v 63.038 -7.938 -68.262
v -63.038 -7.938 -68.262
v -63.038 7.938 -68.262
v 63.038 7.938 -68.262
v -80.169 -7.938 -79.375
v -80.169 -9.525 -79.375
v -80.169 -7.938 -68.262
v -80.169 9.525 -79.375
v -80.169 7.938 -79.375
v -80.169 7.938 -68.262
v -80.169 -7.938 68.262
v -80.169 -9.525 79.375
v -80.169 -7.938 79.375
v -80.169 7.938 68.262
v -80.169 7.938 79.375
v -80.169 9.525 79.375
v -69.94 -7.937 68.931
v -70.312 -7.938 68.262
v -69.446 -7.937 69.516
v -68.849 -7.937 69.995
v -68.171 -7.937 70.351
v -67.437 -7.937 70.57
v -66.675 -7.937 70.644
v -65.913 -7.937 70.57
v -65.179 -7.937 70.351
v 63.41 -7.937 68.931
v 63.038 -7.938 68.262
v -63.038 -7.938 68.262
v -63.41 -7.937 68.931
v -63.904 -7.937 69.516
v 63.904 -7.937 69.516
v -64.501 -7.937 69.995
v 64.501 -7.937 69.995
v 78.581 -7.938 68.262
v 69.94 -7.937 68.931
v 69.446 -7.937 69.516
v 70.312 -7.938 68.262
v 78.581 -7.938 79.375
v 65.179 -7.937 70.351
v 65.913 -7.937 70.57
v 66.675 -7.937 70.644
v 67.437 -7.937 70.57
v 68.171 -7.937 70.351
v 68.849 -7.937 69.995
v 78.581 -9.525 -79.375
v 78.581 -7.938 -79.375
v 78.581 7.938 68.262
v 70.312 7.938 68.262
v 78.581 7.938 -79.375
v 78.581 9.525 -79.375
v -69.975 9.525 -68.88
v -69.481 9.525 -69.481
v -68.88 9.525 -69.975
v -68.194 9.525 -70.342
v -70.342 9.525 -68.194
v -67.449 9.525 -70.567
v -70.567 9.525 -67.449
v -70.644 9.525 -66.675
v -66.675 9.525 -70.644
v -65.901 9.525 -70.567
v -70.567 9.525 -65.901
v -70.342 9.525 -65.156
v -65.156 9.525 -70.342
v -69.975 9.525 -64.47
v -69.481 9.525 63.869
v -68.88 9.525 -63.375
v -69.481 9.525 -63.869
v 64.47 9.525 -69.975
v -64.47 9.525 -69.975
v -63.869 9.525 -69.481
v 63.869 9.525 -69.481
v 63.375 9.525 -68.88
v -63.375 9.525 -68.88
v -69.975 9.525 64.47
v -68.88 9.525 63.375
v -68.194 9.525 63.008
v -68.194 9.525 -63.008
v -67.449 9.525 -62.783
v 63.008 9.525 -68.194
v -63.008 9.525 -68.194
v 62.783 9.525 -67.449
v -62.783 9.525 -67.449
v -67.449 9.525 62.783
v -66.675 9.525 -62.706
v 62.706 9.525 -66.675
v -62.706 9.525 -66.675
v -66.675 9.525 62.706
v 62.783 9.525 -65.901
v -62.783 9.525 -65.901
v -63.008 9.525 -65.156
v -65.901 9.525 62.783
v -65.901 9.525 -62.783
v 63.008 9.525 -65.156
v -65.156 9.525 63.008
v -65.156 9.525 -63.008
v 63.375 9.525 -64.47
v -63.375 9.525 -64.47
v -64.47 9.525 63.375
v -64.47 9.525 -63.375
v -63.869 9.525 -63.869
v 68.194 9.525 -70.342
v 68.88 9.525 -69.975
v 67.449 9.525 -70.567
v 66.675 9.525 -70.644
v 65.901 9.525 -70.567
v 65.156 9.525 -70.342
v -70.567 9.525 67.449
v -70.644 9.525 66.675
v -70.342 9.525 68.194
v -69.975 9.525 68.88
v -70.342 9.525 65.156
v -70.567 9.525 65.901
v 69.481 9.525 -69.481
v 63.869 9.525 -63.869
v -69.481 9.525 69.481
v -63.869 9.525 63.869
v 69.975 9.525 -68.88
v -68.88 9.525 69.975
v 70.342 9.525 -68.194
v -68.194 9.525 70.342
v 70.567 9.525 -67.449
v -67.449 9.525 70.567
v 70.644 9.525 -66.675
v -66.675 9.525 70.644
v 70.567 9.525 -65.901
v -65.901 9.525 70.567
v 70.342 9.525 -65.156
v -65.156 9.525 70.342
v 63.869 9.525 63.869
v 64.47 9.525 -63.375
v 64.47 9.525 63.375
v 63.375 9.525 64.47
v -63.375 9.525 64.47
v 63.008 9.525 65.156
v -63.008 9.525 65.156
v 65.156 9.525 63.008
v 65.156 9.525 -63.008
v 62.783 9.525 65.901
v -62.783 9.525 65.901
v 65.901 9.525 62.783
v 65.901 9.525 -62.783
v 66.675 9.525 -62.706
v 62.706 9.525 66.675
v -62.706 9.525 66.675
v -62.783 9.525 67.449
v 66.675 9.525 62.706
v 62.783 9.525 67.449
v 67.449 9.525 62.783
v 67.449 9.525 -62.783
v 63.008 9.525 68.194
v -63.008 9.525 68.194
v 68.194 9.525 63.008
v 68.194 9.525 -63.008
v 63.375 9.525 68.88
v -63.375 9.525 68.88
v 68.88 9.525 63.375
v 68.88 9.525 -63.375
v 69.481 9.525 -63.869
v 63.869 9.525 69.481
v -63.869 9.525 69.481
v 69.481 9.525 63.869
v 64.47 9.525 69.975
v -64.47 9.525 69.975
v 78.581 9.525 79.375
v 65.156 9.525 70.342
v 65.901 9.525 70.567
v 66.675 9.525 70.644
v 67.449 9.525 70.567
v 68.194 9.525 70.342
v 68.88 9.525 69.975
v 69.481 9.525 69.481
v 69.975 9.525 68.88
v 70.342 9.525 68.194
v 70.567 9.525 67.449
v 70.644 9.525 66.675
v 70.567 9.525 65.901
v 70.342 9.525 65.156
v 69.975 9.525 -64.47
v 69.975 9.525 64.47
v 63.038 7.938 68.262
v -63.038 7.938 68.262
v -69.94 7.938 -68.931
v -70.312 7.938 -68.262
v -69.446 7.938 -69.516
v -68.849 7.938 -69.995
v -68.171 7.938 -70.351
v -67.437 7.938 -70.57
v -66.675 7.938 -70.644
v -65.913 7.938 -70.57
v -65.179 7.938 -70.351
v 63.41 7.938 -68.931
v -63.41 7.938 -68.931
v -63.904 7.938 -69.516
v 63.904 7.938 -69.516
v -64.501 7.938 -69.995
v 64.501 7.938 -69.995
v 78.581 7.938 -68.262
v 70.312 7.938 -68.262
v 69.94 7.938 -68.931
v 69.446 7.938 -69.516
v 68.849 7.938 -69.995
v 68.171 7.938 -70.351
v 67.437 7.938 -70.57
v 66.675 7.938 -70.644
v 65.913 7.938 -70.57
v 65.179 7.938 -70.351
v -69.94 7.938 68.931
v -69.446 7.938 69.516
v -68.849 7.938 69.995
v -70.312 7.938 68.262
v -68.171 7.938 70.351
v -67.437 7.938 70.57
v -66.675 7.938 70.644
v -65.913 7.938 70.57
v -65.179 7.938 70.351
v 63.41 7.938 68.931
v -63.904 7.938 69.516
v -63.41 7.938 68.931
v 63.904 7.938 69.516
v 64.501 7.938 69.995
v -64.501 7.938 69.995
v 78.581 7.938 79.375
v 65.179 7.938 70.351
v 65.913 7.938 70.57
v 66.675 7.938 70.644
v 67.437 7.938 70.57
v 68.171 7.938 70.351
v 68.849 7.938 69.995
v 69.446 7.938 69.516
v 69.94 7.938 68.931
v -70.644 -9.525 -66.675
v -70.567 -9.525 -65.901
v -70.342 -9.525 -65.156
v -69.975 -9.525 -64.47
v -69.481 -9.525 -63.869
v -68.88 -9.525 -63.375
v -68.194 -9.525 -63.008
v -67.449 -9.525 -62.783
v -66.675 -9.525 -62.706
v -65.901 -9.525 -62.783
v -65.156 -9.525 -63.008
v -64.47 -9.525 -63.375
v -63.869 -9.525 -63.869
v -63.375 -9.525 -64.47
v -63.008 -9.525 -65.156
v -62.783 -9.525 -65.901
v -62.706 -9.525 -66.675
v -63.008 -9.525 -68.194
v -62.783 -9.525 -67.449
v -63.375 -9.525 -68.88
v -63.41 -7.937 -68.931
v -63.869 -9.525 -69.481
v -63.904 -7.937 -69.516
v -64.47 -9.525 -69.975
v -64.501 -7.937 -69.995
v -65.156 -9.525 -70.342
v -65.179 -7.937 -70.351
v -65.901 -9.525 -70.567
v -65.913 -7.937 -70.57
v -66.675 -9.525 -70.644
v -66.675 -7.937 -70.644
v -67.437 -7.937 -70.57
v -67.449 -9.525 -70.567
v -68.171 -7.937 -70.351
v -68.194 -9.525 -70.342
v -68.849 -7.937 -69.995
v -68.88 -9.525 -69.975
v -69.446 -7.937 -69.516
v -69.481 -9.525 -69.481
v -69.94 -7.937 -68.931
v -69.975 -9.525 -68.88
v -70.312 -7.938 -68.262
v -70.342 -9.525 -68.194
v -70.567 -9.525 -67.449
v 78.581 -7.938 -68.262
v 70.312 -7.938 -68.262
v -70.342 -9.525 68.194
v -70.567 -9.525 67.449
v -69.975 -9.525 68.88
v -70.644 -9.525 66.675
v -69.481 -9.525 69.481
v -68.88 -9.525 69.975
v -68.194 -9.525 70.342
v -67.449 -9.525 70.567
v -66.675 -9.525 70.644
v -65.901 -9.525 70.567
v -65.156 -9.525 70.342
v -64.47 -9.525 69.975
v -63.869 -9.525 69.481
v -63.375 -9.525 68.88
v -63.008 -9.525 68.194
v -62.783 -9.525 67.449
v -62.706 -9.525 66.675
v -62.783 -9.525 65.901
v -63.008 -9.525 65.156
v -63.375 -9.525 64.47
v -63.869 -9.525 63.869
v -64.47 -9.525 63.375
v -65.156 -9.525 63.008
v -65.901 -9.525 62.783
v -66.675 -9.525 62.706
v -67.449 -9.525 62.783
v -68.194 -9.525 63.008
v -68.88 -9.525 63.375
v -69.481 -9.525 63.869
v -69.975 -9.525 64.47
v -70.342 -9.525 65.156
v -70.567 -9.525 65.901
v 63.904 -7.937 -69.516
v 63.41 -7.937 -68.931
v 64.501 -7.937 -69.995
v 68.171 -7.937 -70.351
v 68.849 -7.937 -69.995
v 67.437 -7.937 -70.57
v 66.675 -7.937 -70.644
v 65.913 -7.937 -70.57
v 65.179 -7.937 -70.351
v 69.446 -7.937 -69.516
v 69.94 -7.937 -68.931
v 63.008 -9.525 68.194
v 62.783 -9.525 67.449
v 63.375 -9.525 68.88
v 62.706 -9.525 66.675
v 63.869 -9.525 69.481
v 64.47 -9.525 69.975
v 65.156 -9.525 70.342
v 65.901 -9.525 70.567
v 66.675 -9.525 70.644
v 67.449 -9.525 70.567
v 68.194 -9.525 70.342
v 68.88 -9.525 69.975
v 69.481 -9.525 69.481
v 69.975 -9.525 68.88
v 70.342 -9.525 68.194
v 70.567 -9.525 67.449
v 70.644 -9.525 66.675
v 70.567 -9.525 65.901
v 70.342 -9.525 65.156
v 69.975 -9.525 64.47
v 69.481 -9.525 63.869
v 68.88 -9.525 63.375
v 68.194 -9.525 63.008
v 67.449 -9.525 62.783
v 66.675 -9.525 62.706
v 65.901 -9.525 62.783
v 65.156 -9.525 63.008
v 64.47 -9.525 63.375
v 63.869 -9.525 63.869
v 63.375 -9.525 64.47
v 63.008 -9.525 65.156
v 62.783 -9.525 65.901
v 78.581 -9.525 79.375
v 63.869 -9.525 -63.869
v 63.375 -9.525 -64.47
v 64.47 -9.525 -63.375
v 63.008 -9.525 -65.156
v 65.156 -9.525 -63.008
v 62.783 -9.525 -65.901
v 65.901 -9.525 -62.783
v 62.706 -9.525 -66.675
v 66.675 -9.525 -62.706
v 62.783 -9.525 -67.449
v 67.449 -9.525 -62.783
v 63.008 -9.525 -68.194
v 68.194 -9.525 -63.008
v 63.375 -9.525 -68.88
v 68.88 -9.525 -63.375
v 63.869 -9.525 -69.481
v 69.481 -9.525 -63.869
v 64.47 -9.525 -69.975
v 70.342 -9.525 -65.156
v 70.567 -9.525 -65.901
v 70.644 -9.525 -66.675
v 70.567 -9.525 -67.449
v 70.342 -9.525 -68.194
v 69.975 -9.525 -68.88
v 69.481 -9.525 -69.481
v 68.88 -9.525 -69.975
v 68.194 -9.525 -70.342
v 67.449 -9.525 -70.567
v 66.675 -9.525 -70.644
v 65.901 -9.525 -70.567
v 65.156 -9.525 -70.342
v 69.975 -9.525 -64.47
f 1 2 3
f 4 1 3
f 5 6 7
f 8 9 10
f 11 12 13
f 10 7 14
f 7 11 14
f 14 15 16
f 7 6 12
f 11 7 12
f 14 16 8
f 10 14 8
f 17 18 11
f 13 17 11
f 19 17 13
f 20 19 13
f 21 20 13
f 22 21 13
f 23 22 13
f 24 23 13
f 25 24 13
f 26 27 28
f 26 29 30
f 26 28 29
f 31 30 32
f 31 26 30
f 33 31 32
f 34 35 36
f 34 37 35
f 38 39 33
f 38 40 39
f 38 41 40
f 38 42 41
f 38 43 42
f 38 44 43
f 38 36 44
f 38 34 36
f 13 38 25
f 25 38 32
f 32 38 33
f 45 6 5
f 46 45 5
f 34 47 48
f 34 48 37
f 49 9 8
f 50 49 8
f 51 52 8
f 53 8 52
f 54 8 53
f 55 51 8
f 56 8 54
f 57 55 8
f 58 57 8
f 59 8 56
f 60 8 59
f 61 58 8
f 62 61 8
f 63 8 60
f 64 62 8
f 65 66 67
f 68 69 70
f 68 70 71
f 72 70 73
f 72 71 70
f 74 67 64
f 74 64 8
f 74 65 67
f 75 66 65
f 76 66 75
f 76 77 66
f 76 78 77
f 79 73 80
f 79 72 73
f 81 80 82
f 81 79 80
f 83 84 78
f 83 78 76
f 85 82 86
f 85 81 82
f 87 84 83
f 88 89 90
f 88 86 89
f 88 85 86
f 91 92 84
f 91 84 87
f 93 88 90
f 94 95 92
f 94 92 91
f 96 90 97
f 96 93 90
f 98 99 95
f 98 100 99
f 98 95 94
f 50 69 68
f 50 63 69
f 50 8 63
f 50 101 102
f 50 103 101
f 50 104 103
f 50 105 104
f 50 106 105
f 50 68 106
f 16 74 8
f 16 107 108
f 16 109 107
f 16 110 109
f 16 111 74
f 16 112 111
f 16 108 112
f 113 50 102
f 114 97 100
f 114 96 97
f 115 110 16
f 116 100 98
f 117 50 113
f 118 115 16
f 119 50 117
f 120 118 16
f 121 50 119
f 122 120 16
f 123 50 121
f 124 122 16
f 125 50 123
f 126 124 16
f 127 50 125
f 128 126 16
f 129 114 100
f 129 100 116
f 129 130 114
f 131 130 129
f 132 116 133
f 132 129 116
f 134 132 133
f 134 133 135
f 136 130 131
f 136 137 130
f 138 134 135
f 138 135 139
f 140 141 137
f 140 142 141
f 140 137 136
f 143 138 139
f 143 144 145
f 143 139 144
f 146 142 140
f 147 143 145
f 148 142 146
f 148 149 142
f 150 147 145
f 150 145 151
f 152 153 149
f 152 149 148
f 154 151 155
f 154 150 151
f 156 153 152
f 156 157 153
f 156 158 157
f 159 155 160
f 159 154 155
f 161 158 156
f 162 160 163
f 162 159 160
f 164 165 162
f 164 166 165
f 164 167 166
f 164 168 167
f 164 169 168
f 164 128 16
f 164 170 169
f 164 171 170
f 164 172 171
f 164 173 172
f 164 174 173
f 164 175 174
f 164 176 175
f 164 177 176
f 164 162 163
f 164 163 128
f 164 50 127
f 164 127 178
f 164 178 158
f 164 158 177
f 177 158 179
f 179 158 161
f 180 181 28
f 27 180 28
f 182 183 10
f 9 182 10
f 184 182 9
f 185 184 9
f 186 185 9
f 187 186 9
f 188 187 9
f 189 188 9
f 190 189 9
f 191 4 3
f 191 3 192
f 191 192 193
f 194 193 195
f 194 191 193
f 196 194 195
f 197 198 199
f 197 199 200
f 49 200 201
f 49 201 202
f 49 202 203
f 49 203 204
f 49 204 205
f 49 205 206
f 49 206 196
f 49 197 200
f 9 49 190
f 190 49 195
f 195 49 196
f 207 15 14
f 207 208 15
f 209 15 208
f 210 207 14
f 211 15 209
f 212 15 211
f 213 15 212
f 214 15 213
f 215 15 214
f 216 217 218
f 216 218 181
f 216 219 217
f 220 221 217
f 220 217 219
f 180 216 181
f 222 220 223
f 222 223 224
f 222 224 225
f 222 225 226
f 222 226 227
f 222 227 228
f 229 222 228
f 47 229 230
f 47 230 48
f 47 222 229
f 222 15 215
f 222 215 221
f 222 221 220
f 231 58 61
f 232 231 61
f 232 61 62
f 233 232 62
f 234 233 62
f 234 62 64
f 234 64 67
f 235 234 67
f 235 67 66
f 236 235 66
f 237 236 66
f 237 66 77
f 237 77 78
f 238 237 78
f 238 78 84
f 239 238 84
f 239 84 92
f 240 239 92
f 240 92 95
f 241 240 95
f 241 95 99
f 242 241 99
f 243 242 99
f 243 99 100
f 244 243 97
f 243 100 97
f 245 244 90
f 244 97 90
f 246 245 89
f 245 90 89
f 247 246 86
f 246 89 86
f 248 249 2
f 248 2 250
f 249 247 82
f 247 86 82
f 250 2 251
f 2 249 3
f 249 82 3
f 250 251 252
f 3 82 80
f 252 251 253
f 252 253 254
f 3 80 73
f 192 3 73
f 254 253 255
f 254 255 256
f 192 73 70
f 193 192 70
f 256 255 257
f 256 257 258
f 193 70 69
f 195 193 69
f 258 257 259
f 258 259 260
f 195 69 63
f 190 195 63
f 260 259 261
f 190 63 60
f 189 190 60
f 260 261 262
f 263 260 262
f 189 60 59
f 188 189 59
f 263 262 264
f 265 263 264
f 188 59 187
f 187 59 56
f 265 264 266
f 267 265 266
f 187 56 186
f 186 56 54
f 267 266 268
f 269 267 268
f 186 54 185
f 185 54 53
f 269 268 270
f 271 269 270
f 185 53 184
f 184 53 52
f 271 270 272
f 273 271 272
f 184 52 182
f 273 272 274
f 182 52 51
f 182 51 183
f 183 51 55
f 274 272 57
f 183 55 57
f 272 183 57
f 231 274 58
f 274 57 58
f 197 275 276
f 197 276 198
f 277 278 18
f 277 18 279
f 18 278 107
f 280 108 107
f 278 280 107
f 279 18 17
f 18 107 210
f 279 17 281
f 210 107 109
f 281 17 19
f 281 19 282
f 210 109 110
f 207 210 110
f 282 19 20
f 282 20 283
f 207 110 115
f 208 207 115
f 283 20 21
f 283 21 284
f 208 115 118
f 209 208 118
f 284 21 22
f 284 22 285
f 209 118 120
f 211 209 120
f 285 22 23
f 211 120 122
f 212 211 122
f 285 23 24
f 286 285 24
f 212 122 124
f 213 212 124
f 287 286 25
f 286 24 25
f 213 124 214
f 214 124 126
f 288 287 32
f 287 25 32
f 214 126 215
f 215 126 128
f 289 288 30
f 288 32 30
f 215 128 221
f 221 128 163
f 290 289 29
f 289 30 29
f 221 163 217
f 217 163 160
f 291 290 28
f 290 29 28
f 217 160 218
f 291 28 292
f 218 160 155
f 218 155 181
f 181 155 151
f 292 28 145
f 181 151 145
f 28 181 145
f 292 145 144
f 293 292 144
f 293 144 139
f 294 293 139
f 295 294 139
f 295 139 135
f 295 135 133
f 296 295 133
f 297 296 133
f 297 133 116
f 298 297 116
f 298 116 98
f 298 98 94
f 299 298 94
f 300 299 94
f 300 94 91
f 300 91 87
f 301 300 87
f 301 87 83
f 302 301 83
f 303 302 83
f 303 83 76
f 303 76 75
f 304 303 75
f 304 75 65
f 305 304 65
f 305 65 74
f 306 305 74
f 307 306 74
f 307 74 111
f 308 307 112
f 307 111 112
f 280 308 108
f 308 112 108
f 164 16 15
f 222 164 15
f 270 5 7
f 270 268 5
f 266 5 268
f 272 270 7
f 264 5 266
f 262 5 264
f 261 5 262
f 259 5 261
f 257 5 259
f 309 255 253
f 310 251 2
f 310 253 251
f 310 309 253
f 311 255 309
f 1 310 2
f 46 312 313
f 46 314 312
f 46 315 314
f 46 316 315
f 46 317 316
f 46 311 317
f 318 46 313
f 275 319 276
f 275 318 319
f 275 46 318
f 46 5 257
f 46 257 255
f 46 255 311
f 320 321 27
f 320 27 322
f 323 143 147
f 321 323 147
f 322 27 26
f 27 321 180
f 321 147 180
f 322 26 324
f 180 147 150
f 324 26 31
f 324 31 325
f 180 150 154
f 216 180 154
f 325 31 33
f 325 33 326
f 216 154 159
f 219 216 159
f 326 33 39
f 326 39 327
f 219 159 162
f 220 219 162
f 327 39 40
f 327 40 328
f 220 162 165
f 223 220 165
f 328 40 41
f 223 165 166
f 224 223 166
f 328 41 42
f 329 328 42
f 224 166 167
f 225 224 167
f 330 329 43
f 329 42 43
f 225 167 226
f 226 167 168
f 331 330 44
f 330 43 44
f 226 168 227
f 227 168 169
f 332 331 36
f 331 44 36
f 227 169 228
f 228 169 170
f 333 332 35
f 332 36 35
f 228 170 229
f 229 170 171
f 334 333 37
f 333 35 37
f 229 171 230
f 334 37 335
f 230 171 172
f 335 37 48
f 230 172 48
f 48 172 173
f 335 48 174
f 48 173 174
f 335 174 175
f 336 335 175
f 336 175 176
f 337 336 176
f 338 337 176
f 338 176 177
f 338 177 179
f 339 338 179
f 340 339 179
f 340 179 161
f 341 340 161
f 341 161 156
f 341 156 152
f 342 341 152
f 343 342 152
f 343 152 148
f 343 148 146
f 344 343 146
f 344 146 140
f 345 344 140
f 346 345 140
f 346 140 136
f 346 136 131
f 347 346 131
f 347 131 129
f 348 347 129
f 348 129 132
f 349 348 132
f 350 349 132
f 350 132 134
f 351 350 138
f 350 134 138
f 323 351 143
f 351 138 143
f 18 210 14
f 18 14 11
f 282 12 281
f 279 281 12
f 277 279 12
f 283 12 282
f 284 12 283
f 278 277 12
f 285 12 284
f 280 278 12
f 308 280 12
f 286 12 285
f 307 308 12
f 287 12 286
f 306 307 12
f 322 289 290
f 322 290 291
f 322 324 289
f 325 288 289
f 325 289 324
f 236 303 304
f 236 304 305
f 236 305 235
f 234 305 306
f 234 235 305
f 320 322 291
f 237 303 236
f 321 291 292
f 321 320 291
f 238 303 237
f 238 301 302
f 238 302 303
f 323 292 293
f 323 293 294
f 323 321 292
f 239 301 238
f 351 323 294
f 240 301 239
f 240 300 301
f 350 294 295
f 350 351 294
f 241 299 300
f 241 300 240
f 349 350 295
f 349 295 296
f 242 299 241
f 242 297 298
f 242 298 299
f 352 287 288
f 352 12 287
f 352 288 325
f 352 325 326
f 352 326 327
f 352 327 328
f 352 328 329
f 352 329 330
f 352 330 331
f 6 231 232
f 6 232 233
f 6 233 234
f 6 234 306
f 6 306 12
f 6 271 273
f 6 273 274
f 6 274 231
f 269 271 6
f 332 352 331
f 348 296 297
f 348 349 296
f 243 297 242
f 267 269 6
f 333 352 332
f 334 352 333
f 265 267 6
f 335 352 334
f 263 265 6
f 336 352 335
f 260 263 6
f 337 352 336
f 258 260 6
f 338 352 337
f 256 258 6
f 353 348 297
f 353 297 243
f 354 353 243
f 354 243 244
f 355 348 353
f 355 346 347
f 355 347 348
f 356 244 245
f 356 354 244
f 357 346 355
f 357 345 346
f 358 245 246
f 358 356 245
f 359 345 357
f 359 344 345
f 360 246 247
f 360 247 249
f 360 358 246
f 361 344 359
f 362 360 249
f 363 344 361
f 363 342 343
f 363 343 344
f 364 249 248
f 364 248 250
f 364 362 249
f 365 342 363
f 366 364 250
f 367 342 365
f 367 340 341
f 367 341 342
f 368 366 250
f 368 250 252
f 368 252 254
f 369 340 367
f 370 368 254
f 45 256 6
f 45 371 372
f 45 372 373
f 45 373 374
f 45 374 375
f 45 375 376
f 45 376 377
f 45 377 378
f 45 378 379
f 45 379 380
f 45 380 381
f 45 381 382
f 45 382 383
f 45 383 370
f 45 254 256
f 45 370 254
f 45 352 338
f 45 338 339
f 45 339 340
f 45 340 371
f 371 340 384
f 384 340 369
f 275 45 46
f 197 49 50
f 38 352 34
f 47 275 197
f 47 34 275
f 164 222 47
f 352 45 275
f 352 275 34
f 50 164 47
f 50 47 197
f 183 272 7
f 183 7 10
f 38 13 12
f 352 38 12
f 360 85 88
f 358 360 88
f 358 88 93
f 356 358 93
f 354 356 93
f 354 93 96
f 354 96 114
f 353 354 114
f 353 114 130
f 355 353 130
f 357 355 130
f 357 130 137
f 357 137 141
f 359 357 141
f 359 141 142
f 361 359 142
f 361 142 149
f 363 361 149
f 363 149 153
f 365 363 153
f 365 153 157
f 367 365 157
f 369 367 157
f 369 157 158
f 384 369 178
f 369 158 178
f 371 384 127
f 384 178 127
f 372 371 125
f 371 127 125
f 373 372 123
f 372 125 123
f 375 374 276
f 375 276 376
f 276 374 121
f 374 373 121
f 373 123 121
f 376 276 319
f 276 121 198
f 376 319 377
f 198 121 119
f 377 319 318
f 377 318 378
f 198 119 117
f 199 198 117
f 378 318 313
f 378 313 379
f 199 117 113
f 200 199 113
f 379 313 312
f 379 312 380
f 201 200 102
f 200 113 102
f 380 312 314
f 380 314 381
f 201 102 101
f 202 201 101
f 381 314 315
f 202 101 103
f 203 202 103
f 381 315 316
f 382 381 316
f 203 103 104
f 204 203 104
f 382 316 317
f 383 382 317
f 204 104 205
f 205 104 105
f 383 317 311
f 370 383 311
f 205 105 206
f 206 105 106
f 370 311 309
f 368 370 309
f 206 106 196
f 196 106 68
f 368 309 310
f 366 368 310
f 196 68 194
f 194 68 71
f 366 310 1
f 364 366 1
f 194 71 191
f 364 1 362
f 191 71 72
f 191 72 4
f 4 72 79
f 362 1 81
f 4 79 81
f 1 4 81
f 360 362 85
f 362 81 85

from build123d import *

# Parameters (mm, degrees)
F2_DEPTH = 158.75
F3_R     = 3.96875
F4_DEPTH = 19.051


with BuildPart() as f2:
    # F1 (on offset) → F2 (new body)
    with BuildSketch(Plane.YZ.offset(78.58125)):
        Polygon((-7.9375, 79.375), (-9.525, 79.375), (-9.525, -79.375), (-7.9375, -79.375), (-7.9375, -68.2625), (7.9375, -68.2625), (7.9375, -79.375), (9.525, -79.375), (9.525, 79.375), (7.9375, 79.375), (7.9375, 68.2625), (-7.9375, 68.2625), align=None)
    extrude(amount=-F2_DEPTH)

    # F3 (on face) → F4 (cut, through all)
    with BuildSketch(Plane(origin=(0, 9.525, 0), x_dir=(-1, 0, 0), z_dir=(0, 1, 0))):
        with Locations((66.675, 66.675)):
            Circle(F3_R)
        with Locations((-66.675, 66.675)):
            Circle(F3_R)
        with Locations((-66.675, -66.675)):
            Circle(F3_R)
        with Locations((66.675, -66.675)):
            Circle(F3_R)
    extrude(amount=-F4_DEPTH, mode=Mode.SUBTRACT)


solid = f2.part
